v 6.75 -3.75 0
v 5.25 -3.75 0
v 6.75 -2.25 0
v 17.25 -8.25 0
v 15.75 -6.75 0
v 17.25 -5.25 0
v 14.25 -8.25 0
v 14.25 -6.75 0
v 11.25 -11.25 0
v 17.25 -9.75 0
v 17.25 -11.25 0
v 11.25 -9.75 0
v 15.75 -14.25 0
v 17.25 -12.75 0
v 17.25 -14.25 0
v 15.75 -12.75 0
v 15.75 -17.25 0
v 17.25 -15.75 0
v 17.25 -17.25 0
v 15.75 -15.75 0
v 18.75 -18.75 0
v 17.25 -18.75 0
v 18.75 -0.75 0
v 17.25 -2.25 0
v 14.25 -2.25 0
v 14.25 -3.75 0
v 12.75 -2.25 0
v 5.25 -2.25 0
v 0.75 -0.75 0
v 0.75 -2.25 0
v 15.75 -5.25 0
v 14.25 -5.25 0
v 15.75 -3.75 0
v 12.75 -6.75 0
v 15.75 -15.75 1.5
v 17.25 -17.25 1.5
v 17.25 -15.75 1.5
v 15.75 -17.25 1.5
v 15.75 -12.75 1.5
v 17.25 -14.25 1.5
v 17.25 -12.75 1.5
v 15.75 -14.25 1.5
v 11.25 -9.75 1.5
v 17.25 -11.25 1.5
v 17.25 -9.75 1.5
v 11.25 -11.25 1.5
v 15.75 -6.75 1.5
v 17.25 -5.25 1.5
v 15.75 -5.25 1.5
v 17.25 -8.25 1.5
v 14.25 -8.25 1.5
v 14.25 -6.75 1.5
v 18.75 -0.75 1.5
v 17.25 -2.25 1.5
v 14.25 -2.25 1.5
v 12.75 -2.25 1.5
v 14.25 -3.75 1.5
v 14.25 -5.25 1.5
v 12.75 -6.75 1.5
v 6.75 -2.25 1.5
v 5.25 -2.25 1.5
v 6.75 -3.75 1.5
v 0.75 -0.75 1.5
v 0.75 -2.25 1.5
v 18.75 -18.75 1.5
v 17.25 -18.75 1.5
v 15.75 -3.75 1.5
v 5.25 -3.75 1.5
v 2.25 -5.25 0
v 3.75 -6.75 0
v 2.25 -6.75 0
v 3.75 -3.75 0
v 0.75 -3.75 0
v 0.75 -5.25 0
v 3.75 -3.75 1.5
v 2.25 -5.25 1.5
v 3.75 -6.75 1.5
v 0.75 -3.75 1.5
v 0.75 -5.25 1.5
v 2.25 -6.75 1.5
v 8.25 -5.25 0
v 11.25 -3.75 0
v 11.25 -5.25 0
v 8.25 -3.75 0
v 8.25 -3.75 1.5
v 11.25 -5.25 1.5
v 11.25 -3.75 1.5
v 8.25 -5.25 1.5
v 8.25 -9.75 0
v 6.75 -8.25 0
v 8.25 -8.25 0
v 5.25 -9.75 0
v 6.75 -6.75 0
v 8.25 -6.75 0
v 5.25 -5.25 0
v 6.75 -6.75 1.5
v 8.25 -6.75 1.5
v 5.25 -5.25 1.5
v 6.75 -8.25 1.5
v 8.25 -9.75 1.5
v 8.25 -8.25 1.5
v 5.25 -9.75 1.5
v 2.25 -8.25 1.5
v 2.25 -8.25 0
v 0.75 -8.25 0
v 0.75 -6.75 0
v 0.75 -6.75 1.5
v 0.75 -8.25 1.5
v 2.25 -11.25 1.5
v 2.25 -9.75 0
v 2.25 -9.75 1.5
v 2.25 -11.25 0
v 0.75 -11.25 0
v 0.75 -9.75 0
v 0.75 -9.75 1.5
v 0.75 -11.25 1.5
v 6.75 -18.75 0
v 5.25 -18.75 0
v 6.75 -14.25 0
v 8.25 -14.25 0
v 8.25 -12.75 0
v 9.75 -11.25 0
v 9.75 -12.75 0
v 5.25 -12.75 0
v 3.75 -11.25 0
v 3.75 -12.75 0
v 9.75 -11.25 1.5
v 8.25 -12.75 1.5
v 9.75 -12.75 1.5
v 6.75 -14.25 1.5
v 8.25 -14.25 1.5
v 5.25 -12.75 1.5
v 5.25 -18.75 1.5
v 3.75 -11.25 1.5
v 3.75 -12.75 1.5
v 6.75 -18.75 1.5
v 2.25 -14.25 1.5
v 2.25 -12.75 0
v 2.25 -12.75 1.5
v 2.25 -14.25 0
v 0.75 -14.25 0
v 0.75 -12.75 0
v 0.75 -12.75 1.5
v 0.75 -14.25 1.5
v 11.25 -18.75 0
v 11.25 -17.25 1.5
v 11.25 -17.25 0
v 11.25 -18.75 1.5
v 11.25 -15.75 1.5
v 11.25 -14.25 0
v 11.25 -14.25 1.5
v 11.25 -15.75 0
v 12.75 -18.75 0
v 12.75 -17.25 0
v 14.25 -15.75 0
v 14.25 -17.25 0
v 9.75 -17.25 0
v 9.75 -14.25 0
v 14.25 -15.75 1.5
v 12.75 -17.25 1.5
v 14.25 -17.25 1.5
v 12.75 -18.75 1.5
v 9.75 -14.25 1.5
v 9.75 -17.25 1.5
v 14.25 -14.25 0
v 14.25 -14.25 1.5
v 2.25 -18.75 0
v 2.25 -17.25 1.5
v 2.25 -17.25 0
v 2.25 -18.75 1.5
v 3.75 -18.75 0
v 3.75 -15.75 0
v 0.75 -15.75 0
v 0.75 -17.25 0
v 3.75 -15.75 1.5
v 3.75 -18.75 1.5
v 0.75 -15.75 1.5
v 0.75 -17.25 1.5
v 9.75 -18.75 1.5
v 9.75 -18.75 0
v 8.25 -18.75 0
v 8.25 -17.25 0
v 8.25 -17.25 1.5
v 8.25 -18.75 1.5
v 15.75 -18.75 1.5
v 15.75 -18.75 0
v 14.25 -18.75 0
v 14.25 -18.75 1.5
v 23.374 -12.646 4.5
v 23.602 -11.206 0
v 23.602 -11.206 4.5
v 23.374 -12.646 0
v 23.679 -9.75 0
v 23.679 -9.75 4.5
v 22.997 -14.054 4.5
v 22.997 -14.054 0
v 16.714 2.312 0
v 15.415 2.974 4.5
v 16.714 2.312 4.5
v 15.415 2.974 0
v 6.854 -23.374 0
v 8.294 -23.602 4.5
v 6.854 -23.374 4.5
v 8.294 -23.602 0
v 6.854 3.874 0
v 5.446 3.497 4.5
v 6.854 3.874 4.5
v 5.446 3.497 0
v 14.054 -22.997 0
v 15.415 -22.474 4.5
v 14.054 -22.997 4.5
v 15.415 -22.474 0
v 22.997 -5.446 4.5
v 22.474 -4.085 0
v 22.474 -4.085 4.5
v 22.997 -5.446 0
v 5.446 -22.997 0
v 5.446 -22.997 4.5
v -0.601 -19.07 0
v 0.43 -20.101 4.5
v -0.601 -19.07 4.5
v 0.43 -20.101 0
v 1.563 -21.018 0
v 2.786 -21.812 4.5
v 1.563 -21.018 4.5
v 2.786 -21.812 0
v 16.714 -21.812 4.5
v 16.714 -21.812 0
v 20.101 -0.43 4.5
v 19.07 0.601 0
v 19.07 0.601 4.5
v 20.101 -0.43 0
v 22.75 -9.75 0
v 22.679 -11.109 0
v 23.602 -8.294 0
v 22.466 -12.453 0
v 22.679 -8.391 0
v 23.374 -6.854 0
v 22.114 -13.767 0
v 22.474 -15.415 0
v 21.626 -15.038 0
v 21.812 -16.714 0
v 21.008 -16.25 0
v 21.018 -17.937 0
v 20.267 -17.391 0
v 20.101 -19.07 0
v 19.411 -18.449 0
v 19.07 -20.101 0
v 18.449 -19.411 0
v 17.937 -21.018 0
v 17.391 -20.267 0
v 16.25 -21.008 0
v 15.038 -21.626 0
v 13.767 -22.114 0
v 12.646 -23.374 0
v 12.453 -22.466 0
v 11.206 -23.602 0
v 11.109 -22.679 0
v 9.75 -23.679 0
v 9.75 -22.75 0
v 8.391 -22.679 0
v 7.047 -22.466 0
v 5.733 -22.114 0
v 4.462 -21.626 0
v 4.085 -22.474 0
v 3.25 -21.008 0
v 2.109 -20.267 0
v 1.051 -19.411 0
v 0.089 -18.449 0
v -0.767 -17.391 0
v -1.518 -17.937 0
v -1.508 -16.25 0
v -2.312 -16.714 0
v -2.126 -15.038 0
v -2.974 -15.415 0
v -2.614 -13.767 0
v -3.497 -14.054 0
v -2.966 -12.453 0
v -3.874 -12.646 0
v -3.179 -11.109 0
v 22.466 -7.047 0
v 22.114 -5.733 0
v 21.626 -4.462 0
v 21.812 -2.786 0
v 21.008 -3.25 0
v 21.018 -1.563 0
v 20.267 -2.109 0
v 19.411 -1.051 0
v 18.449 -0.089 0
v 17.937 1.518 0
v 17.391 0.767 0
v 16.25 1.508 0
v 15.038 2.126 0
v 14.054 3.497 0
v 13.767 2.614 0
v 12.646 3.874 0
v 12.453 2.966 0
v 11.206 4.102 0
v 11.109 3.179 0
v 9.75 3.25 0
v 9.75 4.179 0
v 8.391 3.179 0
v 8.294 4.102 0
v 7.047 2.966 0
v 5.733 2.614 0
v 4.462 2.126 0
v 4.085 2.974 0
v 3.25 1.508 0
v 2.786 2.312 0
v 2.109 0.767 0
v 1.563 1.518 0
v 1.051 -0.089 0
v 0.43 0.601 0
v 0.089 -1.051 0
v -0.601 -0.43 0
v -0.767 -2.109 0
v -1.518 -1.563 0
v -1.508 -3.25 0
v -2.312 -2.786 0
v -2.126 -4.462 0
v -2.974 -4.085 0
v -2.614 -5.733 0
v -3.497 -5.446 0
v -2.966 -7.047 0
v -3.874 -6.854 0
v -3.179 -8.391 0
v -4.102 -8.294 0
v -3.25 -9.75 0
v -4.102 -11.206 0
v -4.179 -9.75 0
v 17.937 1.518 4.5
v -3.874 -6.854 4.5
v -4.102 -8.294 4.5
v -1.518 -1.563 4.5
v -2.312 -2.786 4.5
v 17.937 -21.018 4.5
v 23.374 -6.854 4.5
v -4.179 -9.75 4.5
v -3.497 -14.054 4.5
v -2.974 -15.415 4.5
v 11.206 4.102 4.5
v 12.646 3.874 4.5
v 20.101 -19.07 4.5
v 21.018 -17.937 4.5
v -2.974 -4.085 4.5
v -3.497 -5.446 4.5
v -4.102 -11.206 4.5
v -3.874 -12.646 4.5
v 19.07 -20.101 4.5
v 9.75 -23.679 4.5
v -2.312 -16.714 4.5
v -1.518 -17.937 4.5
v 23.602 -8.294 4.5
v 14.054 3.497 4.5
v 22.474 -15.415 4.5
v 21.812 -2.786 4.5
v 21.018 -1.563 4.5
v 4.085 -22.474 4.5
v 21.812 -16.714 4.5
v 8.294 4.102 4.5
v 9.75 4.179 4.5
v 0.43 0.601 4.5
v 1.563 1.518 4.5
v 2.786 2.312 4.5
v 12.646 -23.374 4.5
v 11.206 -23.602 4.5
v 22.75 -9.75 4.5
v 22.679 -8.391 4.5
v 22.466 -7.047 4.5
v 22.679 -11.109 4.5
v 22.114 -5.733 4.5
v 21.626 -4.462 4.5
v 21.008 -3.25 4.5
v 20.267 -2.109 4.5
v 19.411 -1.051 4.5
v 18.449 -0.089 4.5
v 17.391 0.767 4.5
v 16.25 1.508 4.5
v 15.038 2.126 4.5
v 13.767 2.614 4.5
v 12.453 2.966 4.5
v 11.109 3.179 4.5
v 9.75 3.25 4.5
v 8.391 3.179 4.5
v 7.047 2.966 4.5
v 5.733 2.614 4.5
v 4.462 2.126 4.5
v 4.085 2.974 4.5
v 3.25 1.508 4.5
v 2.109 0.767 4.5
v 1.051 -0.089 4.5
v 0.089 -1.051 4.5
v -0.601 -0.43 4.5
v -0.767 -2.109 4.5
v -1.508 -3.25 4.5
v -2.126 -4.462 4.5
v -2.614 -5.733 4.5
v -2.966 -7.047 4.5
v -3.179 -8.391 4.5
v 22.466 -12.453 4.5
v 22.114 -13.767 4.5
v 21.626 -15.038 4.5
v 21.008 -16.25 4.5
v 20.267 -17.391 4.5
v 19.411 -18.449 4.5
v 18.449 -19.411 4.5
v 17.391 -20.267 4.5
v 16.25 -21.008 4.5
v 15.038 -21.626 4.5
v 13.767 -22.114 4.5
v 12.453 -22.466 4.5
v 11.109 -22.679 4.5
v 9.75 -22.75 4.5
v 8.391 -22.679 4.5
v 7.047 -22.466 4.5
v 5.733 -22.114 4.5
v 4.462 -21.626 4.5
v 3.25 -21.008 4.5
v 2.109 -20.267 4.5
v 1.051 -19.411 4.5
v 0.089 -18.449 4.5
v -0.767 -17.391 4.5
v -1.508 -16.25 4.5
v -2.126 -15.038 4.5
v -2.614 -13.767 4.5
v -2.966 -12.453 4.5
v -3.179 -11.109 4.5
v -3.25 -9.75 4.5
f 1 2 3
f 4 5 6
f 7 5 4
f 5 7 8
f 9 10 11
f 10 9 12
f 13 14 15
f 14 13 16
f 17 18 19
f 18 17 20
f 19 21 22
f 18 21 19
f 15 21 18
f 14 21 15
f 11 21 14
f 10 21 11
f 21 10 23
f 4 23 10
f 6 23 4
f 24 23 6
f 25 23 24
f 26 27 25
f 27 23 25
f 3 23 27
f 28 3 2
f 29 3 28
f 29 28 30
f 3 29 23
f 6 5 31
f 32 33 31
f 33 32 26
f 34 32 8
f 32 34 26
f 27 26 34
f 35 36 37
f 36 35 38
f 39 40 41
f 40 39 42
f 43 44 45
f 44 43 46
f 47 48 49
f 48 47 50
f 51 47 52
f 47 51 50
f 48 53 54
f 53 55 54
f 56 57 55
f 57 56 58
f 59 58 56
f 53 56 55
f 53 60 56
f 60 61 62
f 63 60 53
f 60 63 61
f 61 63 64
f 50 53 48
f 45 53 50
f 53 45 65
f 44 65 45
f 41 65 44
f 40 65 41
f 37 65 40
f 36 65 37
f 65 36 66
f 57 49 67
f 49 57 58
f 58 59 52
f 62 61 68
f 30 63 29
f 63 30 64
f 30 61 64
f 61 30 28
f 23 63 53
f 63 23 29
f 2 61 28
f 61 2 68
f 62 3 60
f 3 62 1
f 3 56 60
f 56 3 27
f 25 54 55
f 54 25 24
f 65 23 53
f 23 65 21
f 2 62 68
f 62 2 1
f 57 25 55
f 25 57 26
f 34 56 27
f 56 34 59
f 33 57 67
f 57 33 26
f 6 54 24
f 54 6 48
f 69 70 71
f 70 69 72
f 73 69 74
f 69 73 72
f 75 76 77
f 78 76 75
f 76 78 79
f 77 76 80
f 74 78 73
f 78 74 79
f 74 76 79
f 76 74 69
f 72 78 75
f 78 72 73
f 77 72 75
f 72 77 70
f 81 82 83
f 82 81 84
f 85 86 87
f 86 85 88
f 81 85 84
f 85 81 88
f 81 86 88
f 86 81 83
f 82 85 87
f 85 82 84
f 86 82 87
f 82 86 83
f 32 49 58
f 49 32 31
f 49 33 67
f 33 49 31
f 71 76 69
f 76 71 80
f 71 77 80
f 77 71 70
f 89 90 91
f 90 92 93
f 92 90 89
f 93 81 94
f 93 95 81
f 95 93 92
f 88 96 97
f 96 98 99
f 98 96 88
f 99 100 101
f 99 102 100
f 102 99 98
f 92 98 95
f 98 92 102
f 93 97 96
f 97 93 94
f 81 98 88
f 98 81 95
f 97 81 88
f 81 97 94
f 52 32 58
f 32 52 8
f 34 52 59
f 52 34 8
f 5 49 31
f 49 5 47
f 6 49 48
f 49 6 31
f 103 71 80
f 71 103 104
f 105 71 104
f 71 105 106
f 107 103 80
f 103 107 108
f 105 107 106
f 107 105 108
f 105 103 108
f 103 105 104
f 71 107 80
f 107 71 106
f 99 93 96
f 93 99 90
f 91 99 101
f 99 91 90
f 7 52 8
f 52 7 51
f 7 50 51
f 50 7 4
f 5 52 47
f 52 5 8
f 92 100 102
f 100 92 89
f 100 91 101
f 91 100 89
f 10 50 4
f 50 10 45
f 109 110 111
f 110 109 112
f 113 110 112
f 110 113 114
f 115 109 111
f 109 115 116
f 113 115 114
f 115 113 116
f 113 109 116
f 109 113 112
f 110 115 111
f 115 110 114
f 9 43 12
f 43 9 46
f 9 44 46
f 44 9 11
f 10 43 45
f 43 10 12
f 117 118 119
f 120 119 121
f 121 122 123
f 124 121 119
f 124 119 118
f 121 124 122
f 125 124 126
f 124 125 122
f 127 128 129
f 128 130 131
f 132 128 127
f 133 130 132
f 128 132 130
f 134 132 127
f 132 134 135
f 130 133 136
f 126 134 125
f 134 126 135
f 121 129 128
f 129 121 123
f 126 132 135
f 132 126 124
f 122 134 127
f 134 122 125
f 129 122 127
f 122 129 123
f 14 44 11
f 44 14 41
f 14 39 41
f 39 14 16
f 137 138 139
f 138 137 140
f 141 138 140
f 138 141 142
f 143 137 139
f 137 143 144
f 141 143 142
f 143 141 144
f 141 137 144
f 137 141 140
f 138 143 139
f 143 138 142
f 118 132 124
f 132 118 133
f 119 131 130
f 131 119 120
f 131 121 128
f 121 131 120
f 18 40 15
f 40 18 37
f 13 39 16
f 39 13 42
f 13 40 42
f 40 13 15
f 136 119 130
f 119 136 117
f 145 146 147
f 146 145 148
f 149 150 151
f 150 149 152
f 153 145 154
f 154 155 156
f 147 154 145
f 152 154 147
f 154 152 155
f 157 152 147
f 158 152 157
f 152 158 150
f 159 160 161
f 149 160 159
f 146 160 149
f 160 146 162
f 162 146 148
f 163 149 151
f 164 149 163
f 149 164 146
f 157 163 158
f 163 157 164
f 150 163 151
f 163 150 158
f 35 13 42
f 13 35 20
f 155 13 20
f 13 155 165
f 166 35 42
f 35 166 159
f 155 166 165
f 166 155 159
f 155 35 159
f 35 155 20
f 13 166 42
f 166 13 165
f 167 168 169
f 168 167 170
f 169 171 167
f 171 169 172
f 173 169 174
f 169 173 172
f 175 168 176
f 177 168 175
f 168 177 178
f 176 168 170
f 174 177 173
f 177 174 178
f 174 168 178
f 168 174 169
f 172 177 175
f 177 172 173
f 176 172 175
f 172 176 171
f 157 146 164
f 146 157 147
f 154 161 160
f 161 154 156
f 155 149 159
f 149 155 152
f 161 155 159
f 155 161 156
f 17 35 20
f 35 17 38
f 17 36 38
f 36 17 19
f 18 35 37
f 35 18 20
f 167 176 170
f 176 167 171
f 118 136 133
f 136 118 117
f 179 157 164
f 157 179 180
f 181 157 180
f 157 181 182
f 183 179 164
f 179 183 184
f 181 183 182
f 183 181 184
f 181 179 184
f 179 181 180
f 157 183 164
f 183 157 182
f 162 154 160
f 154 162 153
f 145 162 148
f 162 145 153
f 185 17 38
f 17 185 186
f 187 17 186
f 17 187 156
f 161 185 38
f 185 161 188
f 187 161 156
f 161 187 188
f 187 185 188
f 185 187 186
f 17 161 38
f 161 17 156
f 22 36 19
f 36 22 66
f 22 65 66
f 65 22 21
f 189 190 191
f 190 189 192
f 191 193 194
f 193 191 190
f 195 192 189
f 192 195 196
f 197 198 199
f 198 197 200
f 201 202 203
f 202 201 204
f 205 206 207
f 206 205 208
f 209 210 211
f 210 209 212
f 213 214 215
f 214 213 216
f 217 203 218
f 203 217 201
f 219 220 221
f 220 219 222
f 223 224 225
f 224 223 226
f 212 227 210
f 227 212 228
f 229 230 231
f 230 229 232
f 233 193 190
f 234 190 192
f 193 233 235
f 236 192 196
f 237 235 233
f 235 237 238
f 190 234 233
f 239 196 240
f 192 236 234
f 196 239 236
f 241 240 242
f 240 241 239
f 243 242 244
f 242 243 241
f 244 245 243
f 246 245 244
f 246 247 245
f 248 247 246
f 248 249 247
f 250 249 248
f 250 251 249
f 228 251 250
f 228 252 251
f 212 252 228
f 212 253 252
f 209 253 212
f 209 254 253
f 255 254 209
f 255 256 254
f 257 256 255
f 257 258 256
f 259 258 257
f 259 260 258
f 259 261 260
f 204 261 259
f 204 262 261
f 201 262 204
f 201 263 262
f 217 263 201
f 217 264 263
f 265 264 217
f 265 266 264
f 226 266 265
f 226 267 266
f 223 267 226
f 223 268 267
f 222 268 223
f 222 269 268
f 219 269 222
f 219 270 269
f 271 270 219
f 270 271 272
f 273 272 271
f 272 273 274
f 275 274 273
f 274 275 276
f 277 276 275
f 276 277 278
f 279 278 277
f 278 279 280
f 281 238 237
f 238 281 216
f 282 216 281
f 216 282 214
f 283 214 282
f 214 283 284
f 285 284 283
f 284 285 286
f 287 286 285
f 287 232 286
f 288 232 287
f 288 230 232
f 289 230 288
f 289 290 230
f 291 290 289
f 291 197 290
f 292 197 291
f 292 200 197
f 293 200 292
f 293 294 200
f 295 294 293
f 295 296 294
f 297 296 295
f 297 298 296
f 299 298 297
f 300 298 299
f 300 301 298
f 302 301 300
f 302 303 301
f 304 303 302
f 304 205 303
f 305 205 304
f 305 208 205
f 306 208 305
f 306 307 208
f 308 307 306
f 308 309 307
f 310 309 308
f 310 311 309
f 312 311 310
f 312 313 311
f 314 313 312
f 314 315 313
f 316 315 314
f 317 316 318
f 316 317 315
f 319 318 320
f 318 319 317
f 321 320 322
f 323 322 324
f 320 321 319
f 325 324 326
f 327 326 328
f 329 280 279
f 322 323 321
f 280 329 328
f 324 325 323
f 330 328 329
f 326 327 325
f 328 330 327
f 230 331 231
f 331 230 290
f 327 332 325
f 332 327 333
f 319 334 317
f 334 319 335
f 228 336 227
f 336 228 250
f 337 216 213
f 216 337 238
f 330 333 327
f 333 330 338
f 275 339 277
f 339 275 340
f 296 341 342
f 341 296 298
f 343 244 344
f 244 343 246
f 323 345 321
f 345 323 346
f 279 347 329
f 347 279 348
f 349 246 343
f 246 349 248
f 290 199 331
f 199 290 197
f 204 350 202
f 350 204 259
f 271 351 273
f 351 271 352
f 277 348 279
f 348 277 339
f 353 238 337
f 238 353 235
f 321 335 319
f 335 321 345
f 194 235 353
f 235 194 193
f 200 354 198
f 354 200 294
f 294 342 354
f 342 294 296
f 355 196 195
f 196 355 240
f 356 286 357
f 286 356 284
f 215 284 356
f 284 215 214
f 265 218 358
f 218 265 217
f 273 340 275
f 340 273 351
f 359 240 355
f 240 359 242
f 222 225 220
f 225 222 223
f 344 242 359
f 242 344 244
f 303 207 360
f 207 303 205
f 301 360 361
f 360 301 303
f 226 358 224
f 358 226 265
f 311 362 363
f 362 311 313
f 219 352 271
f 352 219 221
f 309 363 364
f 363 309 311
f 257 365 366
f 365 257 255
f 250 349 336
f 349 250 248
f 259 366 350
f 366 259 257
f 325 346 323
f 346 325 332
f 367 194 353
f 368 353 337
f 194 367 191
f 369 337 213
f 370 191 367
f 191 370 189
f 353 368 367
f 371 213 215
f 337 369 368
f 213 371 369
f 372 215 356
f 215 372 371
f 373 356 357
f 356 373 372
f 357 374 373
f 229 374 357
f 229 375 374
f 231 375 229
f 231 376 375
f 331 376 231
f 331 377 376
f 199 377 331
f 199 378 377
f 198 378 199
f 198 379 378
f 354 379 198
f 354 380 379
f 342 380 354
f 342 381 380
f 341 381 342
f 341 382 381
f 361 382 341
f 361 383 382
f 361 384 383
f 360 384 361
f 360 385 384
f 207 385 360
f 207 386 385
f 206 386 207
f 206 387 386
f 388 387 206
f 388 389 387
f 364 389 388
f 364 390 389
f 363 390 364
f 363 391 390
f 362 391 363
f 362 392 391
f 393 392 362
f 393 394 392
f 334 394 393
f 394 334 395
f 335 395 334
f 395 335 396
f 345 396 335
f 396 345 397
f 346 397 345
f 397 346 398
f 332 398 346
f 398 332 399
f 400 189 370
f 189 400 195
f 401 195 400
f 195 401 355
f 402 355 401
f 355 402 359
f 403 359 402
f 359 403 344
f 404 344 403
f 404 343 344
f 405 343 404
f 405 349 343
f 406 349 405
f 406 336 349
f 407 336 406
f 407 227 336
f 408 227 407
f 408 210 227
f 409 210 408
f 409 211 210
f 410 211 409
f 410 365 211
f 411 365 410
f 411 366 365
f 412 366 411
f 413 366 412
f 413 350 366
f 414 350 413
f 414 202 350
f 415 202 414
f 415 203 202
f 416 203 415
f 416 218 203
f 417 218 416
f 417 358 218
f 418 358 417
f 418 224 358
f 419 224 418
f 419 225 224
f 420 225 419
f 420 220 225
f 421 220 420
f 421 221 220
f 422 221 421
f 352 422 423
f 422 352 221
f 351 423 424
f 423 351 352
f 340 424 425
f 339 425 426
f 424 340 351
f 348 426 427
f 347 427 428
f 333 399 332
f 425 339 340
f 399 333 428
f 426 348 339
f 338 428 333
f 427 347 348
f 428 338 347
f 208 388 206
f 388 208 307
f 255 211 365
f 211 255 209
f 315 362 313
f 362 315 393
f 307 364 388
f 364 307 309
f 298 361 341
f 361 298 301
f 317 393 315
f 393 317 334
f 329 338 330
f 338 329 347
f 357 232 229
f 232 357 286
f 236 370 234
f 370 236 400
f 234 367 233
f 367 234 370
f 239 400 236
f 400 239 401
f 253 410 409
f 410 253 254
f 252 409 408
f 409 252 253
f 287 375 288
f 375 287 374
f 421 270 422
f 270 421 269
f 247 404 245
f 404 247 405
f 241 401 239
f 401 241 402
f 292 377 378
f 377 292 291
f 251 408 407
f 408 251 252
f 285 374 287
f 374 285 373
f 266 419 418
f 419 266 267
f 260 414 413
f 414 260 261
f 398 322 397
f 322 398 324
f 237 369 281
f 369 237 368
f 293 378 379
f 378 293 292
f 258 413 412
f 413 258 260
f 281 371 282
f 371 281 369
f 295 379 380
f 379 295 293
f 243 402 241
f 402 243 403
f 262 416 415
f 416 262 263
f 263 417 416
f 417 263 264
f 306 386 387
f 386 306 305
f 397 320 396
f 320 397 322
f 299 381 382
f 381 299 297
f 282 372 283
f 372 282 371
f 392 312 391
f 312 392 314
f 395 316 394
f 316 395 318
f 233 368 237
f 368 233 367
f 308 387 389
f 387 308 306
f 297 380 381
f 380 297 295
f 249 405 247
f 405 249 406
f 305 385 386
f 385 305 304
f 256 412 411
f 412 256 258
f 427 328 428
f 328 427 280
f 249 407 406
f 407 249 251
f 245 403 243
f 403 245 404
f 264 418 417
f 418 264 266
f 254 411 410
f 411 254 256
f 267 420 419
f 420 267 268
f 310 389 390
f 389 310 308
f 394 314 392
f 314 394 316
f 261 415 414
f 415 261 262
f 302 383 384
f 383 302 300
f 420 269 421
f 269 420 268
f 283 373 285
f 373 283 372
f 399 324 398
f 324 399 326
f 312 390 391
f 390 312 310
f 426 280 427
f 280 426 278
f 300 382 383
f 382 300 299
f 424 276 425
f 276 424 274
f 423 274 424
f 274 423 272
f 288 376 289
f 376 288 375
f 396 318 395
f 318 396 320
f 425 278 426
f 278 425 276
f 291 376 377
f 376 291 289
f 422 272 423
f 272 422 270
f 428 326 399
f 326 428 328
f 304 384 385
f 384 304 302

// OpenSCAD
rotate([180,0,0])translate([0,0,-0.75]){
translate([1.5,1.5,0])  cube(size = [1.5,1.5,1.5], center=true);
translate([3,1.5,0])  cube(size = [1.5,1.5,1.5], center=true);
translate([4.5,1.5,0])  cube(size = [1.5,1.5,1.5], center=true);
translate([6,1.5,0])  cube(size = [1.5,1.5,1.5], center=true);
translate([7.5,1.5,0])  cube(size = [1.5,1.5,1.5], center=true);
translate([9,1.5,0])  cube(size = [1.5,1.5,1.5], center=true);
translate([10.5,1.5,0])  cube(size = [1.5,1.5,1.5], center=true);
translate([12,1.5,0])  cube(size = [1.5,1.5,1.5], center=true);
translate([13.5,1.5,0])  cube(size = [1.5,1.5,1.5], center=true);
translate([15,1.5,0])  cube(size = [1.5,1.5,1.5], center=true);
translate([16.5,1.5,0])  cube(size = [1.5,1.5,1.5], center=true);
translate([18,1.5,0])  cube(size = [1.5,1.5,1.5], center=true);
translate([18,1.5,0])  cube(size = [1.5,1.5,1.5], center=true);
translate([18,1.5,0])  cube(size = [1.5,1.5,1.5], center=true);
translate([18,1.5,0])  cube(size = [1.5,1.5,1.5], center=true);
translate([6,3,0])  cube(size = [1.5,1.5,1.5], center=true);
translate([6,3,0])  cube(size = [1.5,1.5,1.5], center=true);
translate([6,3,0])  cube(size = [1.5,1.5,1.5], center=true);
translate([6,3,0])  cube(size = [1.5,1.5,1.5], center=true);
translate([6,3,0])  cube(size = [1.5,1.5,1.5], center=true);
translate([13.5,3,0])  cube(size = [1.5,1.5,1.5], center=true);
translate([13.5,3,0])  cube(size = [1.5,1.5,1.5], center=true);
translate([13.5,3,0])  cube(size = [1.5,1.5,1.5], center=true);
translate([18,3,0])  cube(size = [1.5,1.5,1.5], center=true);
translate([1.5,4.5,0])  cube(size = [1.5,1.5,1.5], center=true);
translate([3,4.5,0])  cube(size = [1.5,1.5,1.5], center=true);
translate([3,4.5,0])  cube(size = [1.5,1.5,1.5], center=true);
translate([3,4.5,0])  cube(size = [1.5,1.5,1.5], center=true);
translate([3,4.5,0])  cube(size = [1.5,1.5,1.5], center=true);
translate([9,4.5,0])  cube(size = [1.5,1.5,1.5], center=true);
translate([10.5,4.5,0])  cube(size = [1.5,1.5,1.5], center=true);
translate([10.5,4.5,0])  cube(size = [1.5,1.5,1.5], center=true);
translate([13.5,4.5,0])  cube(size = [1.5,1.5,1.5], center=true);
translate([15,4.5,0])  cube(size = [1.5,1.5,1.5], center=true);
translate([15,4.5,0])  cube(size = [1.5,1.5,1.5], center=true);
translate([18,4.5,0])  cube(size = [1.5,1.5,1.5], center=true);
translate([18,4.5,0])  cube(size = [1.5,1.5,1.5], center=true);
translate([3,6,0])  cube(size = [1.5,1.5,1.5], center=true);
translate([3,6,0])  cube(size = [1.5,1.5,1.5], center=true);
translate([6,6,0])  cube(size = [1.5,1.5,1.5], center=true);
translate([7.5,6,0])  cube(size = [1.5,1.5,1.5], center=true);
translate([7.5,6,0])  cube(size = [1.5,1.5,1.5], center=true);
translate([7.5,6,0])  cube(size = [1.5,1.5,1.5], center=true);
translate([7.5,6,0])  cube(size = [1.5,1.5,1.5], center=true);
translate([13.5,6,0])  cube(size = [1.5,1.5,1.5], center=true);
translate([13.5,6,0])  cube(size = [1.5,1.5,1.5], center=true);
translate([16.5,6,0])  cube(size = [1.5,1.5,1.5], center=true);
translate([18,6,0])  cube(size = [1.5,1.5,1.5], center=true);
translate([1.5,7.5,0])  cube(size = [1.5,1.5,1.5], center=true);
translate([1.5,7.5,0])  cube(size = [1.5,1.5,1.5], center=true);
translate([1.5,7.5,0])  cube(size = [1.5,1.5,1.5], center=true);
translate([6,7.5,0])  cube(size = [1.5,1.5,1.5], center=true);
translate([6,7.5,0])  cube(size = [1.5,1.5,1.5], center=true);
translate([6,7.5,0])  cube(size = [1.5,1.5,1.5], center=true);
translate([6,7.5,0])  cube(size = [1.5,1.5,1.5], center=true);
translate([6,7.5,0])  cube(size = [1.5,1.5,1.5], center=true);
translate([6,7.5,0])  cube(size = [1.5,1.5,1.5], center=true);
translate([15,7.5,0])  cube(size = [1.5,1.5,1.5], center=true);
translate([16.5,7.5,0])  cube(size = [1.5,1.5,1.5], center=true);
translate([18,7.5,0])  cube(size = [1.5,1.5,1.5], center=true);
translate([18,7.5,0])  cube(size = [1.5,1.5,1.5], center=true);
translate([18,7.5,0])  cube(size = [1.5,1.5,1.5], center=true);
translate([18,7.5,0])  cube(size = [1.5,1.5,1.5], center=true);
translate([6,9,0])  cube(size = [1.5,1.5,1.5], center=true);
translate([7.5,9,0])  cube(size = [1.5,1.5,1.5], center=true);
translate([7.5,9,0])  cube(size = [1.5,1.5,1.5], center=true);
translate([7.5,9,0])  cube(size = [1.5,1.5,1.5], center=true);
translate([7.5,9,0])  cube(size = [1.5,1.5,1.5], center=true);
translate([7.5,9,0])  cube(size = [1.5,1.5,1.5], center=true);
translate([7.5,9,0])  cube(size = [1.5,1.5,1.5], center=true);
translate([7.5,9,0])  cube(size = [1.5,1.5,1.5], center=true);
translate([18,9,0])  cube(size = [1.5,1.5,1.5], center=true);
translate([1.5,10.5,0])  cube(size = [1.5,1.5,1.5], center=true);
translate([1.5,10.5,0])  cube(size = [1.5,1.5,1.5], center=true);
translate([1.5,10.5,0])  cube(size = [1.5,1.5,1.5], center=true);
translate([1.5,10.5,0])  cube(size = [1.5,1.5,1.5], center=true);
translate([1.5,10.5,0])  cube(size = [1.5,1.5,1.5], center=true);
translate([1.5,10.5,0])  cube(size = [1.5,1.5,1.5], center=true);
translate([1.5,10.5,0])  cube(size = [1.5,1.5,1.5], center=true);
translate([12,10.5,0])  cube(size = [1.5,1.5,1.5], center=true);
translate([13.5,10.5,0])  cube(size = [1.5,1.5,1.5], center=true);
translate([15,10.5,0])  cube(size = [1.5,1.5,1.5], center=true);
translate([16.5,10.5,0])  cube(size = [1.5,1.5,1.5], center=true);
translate([18,10.5,0])  cube(size = [1.5,1.5,1.5], center=true);
translate([18,10.5,0])  cube(size = [1.5,1.5,1.5], center=true);
translate([18,10.5,0])  cube(size = [1.5,1.5,1.5], center=true);
translate([4.5,12,0])  cube(size = [1.5,1.5,1.5], center=true);
translate([6,12,0])  cube(size = [1.5,1.5,1.5], center=true);
translate([7.5,12,0])  cube(size = [1.5,1.5,1.5], center=true);
translate([9,12,0])  cube(size = [1.5,1.5,1.5], center=true);
translate([9,12,0])  cube(size = [1.5,1.5,1.5], center=true);
translate([9,12,0])  cube(size = [1.5,1.5,1.5], center=true);
translate([9,12,0])  cube(size = [1.5,1.5,1.5], center=true);
translate([9,12,0])  cube(size = [1.5,1.5,1.5], center=true);
translate([9,12,0])  cube(size = [1.5,1.5,1.5], center=true);
translate([18,12,0])  cube(size = [1.5,1.5,1.5], center=true);
translate([1.5,13.5,0])  cube(size = [1.5,1.5,1.5], center=true);
translate([1.5,13.5,0])  cube(size = [1.5,1.5,1.5], center=true);
translate([1.5,13.5,0])  cube(size = [1.5,1.5,1.5], center=true);
translate([6,13.5,0])  cube(size = [1.5,1.5,1.5], center=true);
translate([7.5,13.5,0])  cube(size = [1.5,1.5,1.5], center=true);
translate([7.5,13.5,0])  cube(size = [1.5,1.5,1.5], center=true);
translate([7.5,13.5,0])  cube(size = [1.5,1.5,1.5], center=true);
translate([7.5,13.5,0])  cube(size = [1.5,1.5,1.5], center=true);
translate([7.5,13.5,0])  cube(size = [1.5,1.5,1.5], center=true);
translate([7.5,13.5,0])  cube(size = [1.5,1.5,1.5], center=true);
translate([16.5,13.5,0])  cube(size = [1.5,1.5,1.5], center=true);
translate([18,13.5,0])  cube(size = [1.5,1.5,1.5], center=true);
translate([18,13.5,0])  cube(size = [1.5,1.5,1.5], center=true);
translate([18,13.5,0])  cube(size = [1.5,1.5,1.5], center=true);
translate([18,13.5,0])  cube(size = [1.5,1.5,1.5], center=true);
translate([6,15,0])  cube(size = [1.5,1.5,1.5], center=true);
translate([6,15,0])  cube(size = [1.5,1.5,1.5], center=true);
translate([6,15,0])  cube(size = [1.5,1.5,1.5], center=true);
translate([10.5,15,0])  cube(size = [1.5,1.5,1.5], center=true);
translate([10.5,15,0])  cube(size = [1.5,1.5,1.5], center=true);
translate([10.5,15,0])  cube(size = [1.5,1.5,1.5], center=true);
translate([15,15,0])  cube(size = [1.5,1.5,1.5], center=true);
translate([15,15,0])  cube(size = [1.5,1.5,1.5], center=true);
translate([18,15,0])  cube(size = [1.5,1.5,1.5], center=true);
translate([1.5,16.5,0])  cube(size = [1.5,1.5,1.5], center=true);
translate([3,16.5,0])  cube(size = [1.5,1.5,1.5], center=true);
translate([3,16.5,0])  cube(size = [1.5,1.5,1.5], center=true);
translate([6,16.5,0])  cube(size = [1.5,1.5,1.5], center=true);
translate([6,16.5,0])  cube(size = [1.5,1.5,1.5], center=true);
translate([6,16.5,0])  cube(size = [1.5,1.5,1.5], center=true);
translate([10.5,16.5,0])  cube(size = [1.5,1.5,1.5], center=true);
translate([12,16.5,0])  cube(size = [1.5,1.5,1.5], center=true);
translate([13.5,16.5,0])  cube(size = [1.5,1.5,1.5], center=true);
translate([13.5,16.5,0])  cube(size = [1.5,1.5,1.5], center=true);
translate([16.5,16.5,0])  cube(size = [1.5,1.5,1.5], center=true);
translate([18,16.5,0])  cube(size = [1.5,1.5,1.5], center=true);
translate([18,16.5,0])  cube(size = [1.5,1.5,1.5], center=true);
translate([3,18,0])  cube(size = [1.5,1.5,1.5], center=true);
translate([3,18,0])  cube(size = [1.5,1.5,1.5], center=true);
translate([6,18,0])  cube(size = [1.5,1.5,1.5], center=true);
translate([6,18,0])  cube(size = [1.5,1.5,1.5], center=true);
translate([9,18,0])  cube(size = [1.5,1.5,1.5], center=true);
translate([9,18,0])  cube(size = [1.5,1.5,1.5], center=true);
translate([12,18,0])  cube(size = [1.5,1.5,1.5], center=true);
translate([12,18,0])  cube(size = [1.5,1.5,1.5], center=true);
translate([15,18,0])  cube(size = [1.5,1.5,1.5], center=true);
translate([15,18,0])  cube(size = [1.5,1.5,1.5], center=true);
translate([18,18,0])  cube(size = [1.5,1.5,1.5], center=true);
}
rotate([180,0,0])difference(){translate([9.75,9.75,-2.25])  cylinder(r=13.9285714285714,h=4.5,$fn=60, center=true);
translate([9.75,9.75,-2.25])  cylinder(r=13,h=4.5,$fn=60, center=true);
rotate([-180,0,0])rotate([90,90,0])translate([2.25,4.875,0])  cylinder(r=1.5,h=400, $fn=60, center=true);
rotate([-180,0,0])rotate([90,90,0])translate([2.25,14.625,0])  cylinder(r=1.5,h=400, $fn=60, center=true);}
